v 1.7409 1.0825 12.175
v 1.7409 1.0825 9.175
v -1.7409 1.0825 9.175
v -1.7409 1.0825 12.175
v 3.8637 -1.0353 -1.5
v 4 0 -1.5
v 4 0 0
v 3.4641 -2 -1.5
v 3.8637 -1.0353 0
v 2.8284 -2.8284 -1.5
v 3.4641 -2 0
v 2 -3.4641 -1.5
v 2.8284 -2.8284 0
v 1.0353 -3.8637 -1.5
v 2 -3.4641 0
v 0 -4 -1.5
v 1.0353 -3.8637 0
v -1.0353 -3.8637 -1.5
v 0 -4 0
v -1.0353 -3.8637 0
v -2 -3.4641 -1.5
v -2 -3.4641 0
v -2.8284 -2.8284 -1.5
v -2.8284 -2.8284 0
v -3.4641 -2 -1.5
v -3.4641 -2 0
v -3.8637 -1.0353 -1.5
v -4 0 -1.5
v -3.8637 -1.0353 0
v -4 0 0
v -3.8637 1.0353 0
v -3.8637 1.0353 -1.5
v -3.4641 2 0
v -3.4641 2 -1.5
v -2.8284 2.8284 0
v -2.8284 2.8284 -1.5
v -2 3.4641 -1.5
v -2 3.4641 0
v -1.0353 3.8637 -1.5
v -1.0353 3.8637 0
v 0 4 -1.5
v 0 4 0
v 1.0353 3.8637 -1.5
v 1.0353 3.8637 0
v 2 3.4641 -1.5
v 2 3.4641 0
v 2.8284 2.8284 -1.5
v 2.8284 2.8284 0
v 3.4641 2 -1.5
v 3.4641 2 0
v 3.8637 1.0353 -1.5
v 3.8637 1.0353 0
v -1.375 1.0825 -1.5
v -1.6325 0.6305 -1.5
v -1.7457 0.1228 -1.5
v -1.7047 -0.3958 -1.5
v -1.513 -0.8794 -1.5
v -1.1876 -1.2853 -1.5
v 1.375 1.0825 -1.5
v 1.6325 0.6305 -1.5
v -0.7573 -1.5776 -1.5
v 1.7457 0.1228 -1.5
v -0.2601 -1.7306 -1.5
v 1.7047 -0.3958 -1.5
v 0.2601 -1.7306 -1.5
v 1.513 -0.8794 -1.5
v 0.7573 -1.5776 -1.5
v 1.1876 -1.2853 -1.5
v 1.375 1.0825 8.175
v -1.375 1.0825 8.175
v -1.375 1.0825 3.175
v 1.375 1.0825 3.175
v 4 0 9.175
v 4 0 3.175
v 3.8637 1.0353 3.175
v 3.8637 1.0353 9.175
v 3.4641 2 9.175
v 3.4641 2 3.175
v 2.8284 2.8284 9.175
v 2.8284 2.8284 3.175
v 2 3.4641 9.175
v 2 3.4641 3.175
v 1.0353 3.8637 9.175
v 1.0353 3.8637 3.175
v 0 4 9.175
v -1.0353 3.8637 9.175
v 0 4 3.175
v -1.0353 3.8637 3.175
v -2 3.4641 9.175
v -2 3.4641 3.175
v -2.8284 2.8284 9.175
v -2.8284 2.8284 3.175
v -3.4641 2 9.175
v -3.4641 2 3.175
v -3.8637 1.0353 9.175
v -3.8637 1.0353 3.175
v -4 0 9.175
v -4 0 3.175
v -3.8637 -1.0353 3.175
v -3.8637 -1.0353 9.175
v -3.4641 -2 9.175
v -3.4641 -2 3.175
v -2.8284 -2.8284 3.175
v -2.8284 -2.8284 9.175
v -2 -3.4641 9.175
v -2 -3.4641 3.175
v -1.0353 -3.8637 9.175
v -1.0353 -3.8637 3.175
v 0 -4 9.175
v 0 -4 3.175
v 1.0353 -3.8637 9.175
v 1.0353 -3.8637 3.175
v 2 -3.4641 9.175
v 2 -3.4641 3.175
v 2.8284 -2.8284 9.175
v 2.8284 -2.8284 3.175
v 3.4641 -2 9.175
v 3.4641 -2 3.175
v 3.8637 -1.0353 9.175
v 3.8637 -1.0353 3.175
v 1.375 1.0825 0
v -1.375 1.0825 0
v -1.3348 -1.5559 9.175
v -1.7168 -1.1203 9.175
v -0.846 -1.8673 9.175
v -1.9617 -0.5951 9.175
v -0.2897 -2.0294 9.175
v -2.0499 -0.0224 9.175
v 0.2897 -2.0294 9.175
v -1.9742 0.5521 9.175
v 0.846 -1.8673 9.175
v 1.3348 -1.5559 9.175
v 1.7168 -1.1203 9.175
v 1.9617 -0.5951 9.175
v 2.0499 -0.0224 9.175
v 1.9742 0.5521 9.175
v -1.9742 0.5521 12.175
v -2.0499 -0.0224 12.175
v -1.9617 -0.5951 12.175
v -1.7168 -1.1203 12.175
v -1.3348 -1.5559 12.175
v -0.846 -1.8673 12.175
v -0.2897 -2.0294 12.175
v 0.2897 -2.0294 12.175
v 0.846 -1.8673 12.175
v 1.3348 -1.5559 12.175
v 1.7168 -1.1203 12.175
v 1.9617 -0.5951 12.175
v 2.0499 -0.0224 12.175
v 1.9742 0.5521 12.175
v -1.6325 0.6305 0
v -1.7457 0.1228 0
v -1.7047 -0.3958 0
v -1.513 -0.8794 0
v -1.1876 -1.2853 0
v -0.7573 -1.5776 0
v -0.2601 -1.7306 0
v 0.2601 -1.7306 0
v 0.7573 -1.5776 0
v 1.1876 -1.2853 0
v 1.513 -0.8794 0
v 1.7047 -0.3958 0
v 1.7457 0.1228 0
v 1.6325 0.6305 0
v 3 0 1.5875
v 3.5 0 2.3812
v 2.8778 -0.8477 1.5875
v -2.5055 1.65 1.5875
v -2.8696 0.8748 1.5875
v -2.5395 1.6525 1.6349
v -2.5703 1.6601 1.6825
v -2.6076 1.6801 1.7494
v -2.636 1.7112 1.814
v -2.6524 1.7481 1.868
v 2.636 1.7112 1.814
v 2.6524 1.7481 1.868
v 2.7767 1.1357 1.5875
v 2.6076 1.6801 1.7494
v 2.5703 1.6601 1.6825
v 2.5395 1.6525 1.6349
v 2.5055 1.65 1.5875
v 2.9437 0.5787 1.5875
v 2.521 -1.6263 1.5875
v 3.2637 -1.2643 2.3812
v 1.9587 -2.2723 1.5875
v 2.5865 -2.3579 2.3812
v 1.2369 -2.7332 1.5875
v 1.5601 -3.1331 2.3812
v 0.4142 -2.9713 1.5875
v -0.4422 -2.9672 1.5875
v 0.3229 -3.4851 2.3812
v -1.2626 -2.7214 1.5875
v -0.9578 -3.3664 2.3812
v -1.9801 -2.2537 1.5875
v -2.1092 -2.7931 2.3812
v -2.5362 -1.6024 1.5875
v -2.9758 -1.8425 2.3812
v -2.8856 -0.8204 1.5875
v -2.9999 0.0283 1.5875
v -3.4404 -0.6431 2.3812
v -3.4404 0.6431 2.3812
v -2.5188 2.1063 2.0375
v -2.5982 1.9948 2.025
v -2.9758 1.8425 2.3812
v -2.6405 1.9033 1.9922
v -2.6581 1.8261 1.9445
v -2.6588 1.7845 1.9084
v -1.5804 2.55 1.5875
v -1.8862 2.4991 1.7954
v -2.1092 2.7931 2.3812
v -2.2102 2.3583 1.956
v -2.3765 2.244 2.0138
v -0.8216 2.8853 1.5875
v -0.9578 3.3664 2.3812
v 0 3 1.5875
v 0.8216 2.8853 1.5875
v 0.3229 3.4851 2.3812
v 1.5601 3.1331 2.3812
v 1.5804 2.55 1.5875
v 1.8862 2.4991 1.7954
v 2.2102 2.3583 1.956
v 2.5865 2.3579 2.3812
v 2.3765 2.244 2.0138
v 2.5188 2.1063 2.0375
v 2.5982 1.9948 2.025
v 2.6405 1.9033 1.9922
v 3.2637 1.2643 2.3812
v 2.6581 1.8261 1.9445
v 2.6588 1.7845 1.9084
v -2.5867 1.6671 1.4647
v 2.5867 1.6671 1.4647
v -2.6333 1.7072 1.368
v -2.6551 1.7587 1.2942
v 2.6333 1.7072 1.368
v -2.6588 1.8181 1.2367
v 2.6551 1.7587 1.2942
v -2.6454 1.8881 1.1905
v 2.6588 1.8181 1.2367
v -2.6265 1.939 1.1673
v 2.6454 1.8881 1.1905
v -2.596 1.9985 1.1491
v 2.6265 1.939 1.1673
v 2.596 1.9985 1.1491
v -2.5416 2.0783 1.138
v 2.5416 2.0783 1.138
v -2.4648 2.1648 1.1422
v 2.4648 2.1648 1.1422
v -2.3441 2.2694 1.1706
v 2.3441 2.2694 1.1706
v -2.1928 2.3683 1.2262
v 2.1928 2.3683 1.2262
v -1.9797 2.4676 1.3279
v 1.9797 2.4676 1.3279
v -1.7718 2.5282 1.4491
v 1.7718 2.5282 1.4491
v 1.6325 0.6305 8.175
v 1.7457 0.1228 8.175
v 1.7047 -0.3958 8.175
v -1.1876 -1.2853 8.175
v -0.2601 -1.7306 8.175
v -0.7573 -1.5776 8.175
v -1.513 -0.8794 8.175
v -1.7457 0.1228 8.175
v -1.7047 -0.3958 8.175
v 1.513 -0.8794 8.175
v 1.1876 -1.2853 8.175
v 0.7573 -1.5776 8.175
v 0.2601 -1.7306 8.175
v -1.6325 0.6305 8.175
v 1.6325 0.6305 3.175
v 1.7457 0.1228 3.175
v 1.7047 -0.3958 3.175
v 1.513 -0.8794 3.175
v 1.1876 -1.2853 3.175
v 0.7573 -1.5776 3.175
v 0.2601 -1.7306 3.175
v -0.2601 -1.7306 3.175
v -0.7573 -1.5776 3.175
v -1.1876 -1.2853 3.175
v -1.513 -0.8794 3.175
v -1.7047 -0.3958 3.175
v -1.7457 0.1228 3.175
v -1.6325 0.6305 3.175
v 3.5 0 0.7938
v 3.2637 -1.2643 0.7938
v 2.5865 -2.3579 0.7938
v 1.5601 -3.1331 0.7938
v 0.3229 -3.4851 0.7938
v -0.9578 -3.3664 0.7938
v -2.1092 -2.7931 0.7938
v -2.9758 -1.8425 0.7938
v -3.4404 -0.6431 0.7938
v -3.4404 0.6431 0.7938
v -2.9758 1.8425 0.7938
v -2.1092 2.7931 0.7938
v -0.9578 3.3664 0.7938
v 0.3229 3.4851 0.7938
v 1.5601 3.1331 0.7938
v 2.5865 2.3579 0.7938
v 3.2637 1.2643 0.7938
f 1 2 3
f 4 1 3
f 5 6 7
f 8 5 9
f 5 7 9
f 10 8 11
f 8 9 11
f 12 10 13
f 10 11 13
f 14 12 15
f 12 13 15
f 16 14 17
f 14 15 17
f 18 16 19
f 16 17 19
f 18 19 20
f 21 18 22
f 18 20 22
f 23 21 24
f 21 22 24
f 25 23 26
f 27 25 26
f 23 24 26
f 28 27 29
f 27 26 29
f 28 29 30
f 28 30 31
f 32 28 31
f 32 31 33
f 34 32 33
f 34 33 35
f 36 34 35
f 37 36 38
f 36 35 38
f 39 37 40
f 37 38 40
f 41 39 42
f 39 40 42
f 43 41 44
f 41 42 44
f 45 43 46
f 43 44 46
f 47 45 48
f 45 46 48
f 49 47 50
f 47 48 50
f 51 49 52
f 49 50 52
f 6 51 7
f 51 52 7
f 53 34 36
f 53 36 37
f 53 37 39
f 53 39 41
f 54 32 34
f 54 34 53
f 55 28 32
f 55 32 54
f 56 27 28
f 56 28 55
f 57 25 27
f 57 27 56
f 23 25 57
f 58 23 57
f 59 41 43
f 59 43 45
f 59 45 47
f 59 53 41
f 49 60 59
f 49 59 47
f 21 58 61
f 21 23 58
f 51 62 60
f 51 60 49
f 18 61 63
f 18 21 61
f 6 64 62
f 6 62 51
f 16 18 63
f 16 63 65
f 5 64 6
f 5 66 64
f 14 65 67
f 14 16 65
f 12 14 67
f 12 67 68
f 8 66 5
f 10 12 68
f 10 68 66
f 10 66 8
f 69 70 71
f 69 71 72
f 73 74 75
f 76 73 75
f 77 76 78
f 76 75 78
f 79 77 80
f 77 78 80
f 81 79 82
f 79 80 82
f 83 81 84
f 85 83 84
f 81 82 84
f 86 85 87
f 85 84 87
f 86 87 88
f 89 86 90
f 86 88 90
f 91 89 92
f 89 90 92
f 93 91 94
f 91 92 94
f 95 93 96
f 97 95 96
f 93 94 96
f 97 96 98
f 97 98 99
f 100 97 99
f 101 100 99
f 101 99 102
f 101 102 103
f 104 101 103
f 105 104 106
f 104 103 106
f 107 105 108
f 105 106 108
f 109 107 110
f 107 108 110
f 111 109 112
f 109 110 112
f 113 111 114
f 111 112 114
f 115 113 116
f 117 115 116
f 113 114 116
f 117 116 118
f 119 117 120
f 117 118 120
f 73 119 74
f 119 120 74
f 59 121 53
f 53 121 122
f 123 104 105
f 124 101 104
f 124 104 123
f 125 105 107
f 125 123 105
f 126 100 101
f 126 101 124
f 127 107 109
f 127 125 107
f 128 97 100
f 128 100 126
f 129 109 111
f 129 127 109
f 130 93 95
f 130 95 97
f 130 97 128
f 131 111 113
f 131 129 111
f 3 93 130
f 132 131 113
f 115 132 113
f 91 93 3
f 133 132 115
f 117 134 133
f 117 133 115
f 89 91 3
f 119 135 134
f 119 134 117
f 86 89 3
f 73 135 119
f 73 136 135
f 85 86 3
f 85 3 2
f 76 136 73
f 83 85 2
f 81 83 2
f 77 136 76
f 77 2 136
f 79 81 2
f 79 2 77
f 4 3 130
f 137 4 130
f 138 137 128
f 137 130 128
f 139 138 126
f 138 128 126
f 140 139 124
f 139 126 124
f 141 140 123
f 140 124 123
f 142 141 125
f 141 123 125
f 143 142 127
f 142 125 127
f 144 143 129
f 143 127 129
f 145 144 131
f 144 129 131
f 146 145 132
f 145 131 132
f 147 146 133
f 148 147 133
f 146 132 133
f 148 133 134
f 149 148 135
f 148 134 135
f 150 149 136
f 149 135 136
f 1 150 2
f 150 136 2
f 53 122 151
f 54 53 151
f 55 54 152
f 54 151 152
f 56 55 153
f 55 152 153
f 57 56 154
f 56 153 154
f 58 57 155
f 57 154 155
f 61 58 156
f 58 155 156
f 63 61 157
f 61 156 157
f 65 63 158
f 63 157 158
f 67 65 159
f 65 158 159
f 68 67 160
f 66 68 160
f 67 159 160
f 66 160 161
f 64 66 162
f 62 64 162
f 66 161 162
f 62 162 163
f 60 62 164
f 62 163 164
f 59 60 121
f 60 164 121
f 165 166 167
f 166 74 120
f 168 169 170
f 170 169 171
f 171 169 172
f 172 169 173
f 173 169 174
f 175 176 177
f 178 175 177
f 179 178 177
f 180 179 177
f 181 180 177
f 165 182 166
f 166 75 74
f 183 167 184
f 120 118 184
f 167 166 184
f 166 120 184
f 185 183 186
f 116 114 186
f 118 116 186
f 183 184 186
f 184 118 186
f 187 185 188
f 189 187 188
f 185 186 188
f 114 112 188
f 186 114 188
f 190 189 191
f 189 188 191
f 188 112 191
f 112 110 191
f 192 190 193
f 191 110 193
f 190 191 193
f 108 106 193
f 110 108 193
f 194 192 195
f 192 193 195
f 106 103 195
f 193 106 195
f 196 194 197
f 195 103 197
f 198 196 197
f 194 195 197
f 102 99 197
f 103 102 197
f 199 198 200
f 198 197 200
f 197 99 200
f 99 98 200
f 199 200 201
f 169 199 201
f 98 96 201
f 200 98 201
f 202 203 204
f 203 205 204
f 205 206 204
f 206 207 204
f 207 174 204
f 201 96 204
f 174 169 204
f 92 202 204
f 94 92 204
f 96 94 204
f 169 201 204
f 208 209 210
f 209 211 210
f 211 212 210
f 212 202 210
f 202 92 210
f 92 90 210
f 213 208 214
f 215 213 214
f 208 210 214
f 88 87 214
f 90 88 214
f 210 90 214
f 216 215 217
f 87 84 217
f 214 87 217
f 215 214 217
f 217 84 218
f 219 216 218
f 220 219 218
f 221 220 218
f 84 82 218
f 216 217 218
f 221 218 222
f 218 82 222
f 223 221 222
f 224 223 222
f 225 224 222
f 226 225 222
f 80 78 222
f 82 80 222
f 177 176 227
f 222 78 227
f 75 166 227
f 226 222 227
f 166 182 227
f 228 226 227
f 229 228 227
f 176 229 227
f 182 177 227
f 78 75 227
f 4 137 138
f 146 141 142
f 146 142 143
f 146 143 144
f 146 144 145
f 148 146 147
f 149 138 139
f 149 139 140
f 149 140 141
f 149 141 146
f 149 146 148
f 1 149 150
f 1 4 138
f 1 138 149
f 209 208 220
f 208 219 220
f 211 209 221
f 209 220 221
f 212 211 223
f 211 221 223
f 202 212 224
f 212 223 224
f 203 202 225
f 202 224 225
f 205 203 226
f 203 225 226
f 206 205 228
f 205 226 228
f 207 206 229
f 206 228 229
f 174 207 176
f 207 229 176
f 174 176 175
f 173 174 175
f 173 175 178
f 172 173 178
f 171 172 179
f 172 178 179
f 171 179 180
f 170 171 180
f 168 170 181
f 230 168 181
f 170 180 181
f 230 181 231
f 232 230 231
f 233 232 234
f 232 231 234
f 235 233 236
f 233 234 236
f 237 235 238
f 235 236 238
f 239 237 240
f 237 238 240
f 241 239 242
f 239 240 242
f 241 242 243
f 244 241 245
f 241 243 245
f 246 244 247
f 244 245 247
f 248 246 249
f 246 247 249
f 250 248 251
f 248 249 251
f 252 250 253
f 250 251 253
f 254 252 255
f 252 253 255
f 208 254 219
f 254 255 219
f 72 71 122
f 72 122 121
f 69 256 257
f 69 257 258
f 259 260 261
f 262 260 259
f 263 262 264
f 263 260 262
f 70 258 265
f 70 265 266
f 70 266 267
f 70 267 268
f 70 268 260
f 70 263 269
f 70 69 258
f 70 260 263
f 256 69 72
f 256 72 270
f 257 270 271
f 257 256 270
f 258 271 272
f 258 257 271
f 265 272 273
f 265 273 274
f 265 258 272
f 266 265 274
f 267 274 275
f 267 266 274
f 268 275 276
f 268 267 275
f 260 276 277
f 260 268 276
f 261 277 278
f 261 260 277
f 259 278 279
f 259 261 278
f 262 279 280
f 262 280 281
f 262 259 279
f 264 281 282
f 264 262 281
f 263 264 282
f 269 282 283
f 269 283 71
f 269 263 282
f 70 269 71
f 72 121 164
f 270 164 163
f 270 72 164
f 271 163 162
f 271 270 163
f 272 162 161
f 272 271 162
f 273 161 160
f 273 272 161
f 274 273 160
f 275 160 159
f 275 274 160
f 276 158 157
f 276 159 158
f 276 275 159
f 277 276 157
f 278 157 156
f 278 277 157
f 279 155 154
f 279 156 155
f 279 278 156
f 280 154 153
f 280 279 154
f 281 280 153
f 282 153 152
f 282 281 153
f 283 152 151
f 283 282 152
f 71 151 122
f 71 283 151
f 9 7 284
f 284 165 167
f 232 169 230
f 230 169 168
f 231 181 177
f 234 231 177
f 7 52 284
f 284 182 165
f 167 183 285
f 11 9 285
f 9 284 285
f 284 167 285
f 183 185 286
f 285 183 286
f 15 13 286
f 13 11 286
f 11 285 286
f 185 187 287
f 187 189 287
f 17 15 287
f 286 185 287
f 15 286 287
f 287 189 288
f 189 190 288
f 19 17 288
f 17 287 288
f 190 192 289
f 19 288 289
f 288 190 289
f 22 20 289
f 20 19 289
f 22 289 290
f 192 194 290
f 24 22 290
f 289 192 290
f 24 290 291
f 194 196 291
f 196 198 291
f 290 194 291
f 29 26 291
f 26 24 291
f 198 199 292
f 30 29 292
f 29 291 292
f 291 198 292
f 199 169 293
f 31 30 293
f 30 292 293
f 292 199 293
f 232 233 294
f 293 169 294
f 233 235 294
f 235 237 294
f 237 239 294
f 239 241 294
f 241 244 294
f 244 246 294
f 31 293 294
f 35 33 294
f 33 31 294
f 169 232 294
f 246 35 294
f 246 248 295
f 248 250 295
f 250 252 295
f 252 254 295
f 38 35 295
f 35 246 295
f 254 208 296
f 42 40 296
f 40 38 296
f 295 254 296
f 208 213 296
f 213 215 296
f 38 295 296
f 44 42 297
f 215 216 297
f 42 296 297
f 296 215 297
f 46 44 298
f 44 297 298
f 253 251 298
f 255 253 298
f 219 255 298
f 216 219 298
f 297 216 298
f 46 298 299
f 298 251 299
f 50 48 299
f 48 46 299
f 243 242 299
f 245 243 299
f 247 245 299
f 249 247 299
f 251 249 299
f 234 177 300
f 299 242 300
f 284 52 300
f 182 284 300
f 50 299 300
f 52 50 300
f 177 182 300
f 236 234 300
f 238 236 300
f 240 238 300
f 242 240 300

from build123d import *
from build123d.topology import SkipClean

# Parameters (mm, degrees)
SKETCH1_R           = 4
BOSS_EXTRUDE1_DEPTH = 3.175
CUT_EXTRUDE1_DEPTH  = 7.48695807
SKETCH4_R           = 4
BOSS_EXTRUDE2_DEPTH = 6
SKETCH5_R           = 0.45
CUT_EXTRUDE2_DEPTH  = 4
SKETCH6_R           = 4
BOSS_EXTRUDE3_DEPTH = 1.5
BOSS_EXTRUDE4_DEPTH = 3
CUT_EXTRUDE3_START  = -5
CUT_EXTRUDE3_DEPTH  = 5


with BuildPart() as part:
    # Sketch1 → Boss-Extrude1 (new body)
    with BuildSketch(Plane.XY):
        Circle(SKETCH1_R)
    extrude(amount=BOSS_EXTRUDE1_DEPTH)

    # Sketch2 → Cut-Extrude1 (cut, through all)
    with BuildSketch(Plane.XY.offset(3.175)):
        with BuildLine():
            Line((-1.375, 1.082531755), (1.375, 1.082531755))
            ThreePointArc((1.375, 1.082531755), (0, -1.75), (-1.375, 1.082531755))
        make_face()
    extrude(amount=-CUT_EXTRUDE1_DEPTH, mode=Mode.SUBTRACT)

    # Sketch3 → Cut-Revolve1 (revolve, cut)
    with BuildSketch(Plane(origin=(0, 0, 0), x_dir=(0, 0, -1), z_dir=(1, 0, 0)), mode=Mode.PRIVATE) as cut_revolve1_sk:
        Polygon((-3.175, 4), (0, 4), (-1.5875, 3), align=None)
    revolve(cut_revolve1_sk.sketch.rotate(Axis((0, 0, 3.175), (0, 0, -1)), 90), axis=Axis((0, 0, 3.175), (0, 0, -1)), mode=Mode.SUBTRACT)

    # Sketch4 → Boss-Extrude2 (add)
    with BuildSketch(Plane.XY.offset(3.175)):
        Circle(SKETCH4_R)
    extrude(amount=BOSS_EXTRUDE2_DEPTH)

    # Sketch5 → Cut-Extrude2 (cut, symmetric)
    with BuildSketch(Plane(origin=(0, 0, 0), x_dir=(0, 0, -1), z_dir=(1, 0, 0))):
        with Locations(Location((-1.5875, 2.1, 0), (0, 0, 89.999570565))):
            Circle(SKETCH5_R)
    extrude(amount=CUT_EXTRUDE2_DEPTH, both=True, mode=Mode.SUBTRACT)

    # Sketch6 → Boss-Extrude3 (add)
    with SkipClean():  # the faces are left unmerged after this step: merging them gives an invalid solid
        with BuildSketch(Plane(origin=(0, 0, 0), x_dir=(-1, 0, 0), z_dir=(0, 0, -1))):
            with Locations(Location((0, 0, 0), (0, 0, 180))):
                Circle(SKETCH6_R)
            with BuildLine():
                ThreePointArc((1.375, 1.082531755), (0, -1.75), (-1.375, 1.082531755))
                Line((-1.375, 1.082531755), (1.375, 1.082531755))
            make_face(mode=Mode.SUBTRACT)
        extrude(amount=BOSS_EXTRUDE3_DEPTH)

    # Sketch7 → Boss-Extrude4 (add)
    with SkipClean():  # the faces are left unmerged after this step: merging them gives an invalid solid
        with BuildSketch(Plane.XY.offset(9.175)):
            with BuildLine():
                Line((1.740869036, 1.082531755), (-1.740869036, 1.082531755))
                ThreePointArc((-1.740869036, 1.082531755), (0, -2.05), (1.740869036, 1.082531755))
            make_face()
        extrude(amount=BOSS_EXTRUDE4_DEPTH)

    # Sketch8 → Cut-Extrude3 (cut)
    with SkipClean():  # the faces are left unmerged after this step: merging them gives an invalid solid
        with BuildSketch(Plane(origin=(0, 0, 3.175), x_dir=(-1, 0, 0), z_dir=(0, 0, -1)).offset(CUT_EXTRUDE3_START)):
            with BuildLine():
                Line((1.375, 1.082531755), (-1.375, 1.082531755))
                ThreePointArc((-1.375, 1.082531755), (0, -1.75), (1.375, 1.082531755))
            make_face()
        extrude(amount=CUT_EXTRUDE3_DEPTH, mode=Mode.SUBTRACT)


solid = part.part
